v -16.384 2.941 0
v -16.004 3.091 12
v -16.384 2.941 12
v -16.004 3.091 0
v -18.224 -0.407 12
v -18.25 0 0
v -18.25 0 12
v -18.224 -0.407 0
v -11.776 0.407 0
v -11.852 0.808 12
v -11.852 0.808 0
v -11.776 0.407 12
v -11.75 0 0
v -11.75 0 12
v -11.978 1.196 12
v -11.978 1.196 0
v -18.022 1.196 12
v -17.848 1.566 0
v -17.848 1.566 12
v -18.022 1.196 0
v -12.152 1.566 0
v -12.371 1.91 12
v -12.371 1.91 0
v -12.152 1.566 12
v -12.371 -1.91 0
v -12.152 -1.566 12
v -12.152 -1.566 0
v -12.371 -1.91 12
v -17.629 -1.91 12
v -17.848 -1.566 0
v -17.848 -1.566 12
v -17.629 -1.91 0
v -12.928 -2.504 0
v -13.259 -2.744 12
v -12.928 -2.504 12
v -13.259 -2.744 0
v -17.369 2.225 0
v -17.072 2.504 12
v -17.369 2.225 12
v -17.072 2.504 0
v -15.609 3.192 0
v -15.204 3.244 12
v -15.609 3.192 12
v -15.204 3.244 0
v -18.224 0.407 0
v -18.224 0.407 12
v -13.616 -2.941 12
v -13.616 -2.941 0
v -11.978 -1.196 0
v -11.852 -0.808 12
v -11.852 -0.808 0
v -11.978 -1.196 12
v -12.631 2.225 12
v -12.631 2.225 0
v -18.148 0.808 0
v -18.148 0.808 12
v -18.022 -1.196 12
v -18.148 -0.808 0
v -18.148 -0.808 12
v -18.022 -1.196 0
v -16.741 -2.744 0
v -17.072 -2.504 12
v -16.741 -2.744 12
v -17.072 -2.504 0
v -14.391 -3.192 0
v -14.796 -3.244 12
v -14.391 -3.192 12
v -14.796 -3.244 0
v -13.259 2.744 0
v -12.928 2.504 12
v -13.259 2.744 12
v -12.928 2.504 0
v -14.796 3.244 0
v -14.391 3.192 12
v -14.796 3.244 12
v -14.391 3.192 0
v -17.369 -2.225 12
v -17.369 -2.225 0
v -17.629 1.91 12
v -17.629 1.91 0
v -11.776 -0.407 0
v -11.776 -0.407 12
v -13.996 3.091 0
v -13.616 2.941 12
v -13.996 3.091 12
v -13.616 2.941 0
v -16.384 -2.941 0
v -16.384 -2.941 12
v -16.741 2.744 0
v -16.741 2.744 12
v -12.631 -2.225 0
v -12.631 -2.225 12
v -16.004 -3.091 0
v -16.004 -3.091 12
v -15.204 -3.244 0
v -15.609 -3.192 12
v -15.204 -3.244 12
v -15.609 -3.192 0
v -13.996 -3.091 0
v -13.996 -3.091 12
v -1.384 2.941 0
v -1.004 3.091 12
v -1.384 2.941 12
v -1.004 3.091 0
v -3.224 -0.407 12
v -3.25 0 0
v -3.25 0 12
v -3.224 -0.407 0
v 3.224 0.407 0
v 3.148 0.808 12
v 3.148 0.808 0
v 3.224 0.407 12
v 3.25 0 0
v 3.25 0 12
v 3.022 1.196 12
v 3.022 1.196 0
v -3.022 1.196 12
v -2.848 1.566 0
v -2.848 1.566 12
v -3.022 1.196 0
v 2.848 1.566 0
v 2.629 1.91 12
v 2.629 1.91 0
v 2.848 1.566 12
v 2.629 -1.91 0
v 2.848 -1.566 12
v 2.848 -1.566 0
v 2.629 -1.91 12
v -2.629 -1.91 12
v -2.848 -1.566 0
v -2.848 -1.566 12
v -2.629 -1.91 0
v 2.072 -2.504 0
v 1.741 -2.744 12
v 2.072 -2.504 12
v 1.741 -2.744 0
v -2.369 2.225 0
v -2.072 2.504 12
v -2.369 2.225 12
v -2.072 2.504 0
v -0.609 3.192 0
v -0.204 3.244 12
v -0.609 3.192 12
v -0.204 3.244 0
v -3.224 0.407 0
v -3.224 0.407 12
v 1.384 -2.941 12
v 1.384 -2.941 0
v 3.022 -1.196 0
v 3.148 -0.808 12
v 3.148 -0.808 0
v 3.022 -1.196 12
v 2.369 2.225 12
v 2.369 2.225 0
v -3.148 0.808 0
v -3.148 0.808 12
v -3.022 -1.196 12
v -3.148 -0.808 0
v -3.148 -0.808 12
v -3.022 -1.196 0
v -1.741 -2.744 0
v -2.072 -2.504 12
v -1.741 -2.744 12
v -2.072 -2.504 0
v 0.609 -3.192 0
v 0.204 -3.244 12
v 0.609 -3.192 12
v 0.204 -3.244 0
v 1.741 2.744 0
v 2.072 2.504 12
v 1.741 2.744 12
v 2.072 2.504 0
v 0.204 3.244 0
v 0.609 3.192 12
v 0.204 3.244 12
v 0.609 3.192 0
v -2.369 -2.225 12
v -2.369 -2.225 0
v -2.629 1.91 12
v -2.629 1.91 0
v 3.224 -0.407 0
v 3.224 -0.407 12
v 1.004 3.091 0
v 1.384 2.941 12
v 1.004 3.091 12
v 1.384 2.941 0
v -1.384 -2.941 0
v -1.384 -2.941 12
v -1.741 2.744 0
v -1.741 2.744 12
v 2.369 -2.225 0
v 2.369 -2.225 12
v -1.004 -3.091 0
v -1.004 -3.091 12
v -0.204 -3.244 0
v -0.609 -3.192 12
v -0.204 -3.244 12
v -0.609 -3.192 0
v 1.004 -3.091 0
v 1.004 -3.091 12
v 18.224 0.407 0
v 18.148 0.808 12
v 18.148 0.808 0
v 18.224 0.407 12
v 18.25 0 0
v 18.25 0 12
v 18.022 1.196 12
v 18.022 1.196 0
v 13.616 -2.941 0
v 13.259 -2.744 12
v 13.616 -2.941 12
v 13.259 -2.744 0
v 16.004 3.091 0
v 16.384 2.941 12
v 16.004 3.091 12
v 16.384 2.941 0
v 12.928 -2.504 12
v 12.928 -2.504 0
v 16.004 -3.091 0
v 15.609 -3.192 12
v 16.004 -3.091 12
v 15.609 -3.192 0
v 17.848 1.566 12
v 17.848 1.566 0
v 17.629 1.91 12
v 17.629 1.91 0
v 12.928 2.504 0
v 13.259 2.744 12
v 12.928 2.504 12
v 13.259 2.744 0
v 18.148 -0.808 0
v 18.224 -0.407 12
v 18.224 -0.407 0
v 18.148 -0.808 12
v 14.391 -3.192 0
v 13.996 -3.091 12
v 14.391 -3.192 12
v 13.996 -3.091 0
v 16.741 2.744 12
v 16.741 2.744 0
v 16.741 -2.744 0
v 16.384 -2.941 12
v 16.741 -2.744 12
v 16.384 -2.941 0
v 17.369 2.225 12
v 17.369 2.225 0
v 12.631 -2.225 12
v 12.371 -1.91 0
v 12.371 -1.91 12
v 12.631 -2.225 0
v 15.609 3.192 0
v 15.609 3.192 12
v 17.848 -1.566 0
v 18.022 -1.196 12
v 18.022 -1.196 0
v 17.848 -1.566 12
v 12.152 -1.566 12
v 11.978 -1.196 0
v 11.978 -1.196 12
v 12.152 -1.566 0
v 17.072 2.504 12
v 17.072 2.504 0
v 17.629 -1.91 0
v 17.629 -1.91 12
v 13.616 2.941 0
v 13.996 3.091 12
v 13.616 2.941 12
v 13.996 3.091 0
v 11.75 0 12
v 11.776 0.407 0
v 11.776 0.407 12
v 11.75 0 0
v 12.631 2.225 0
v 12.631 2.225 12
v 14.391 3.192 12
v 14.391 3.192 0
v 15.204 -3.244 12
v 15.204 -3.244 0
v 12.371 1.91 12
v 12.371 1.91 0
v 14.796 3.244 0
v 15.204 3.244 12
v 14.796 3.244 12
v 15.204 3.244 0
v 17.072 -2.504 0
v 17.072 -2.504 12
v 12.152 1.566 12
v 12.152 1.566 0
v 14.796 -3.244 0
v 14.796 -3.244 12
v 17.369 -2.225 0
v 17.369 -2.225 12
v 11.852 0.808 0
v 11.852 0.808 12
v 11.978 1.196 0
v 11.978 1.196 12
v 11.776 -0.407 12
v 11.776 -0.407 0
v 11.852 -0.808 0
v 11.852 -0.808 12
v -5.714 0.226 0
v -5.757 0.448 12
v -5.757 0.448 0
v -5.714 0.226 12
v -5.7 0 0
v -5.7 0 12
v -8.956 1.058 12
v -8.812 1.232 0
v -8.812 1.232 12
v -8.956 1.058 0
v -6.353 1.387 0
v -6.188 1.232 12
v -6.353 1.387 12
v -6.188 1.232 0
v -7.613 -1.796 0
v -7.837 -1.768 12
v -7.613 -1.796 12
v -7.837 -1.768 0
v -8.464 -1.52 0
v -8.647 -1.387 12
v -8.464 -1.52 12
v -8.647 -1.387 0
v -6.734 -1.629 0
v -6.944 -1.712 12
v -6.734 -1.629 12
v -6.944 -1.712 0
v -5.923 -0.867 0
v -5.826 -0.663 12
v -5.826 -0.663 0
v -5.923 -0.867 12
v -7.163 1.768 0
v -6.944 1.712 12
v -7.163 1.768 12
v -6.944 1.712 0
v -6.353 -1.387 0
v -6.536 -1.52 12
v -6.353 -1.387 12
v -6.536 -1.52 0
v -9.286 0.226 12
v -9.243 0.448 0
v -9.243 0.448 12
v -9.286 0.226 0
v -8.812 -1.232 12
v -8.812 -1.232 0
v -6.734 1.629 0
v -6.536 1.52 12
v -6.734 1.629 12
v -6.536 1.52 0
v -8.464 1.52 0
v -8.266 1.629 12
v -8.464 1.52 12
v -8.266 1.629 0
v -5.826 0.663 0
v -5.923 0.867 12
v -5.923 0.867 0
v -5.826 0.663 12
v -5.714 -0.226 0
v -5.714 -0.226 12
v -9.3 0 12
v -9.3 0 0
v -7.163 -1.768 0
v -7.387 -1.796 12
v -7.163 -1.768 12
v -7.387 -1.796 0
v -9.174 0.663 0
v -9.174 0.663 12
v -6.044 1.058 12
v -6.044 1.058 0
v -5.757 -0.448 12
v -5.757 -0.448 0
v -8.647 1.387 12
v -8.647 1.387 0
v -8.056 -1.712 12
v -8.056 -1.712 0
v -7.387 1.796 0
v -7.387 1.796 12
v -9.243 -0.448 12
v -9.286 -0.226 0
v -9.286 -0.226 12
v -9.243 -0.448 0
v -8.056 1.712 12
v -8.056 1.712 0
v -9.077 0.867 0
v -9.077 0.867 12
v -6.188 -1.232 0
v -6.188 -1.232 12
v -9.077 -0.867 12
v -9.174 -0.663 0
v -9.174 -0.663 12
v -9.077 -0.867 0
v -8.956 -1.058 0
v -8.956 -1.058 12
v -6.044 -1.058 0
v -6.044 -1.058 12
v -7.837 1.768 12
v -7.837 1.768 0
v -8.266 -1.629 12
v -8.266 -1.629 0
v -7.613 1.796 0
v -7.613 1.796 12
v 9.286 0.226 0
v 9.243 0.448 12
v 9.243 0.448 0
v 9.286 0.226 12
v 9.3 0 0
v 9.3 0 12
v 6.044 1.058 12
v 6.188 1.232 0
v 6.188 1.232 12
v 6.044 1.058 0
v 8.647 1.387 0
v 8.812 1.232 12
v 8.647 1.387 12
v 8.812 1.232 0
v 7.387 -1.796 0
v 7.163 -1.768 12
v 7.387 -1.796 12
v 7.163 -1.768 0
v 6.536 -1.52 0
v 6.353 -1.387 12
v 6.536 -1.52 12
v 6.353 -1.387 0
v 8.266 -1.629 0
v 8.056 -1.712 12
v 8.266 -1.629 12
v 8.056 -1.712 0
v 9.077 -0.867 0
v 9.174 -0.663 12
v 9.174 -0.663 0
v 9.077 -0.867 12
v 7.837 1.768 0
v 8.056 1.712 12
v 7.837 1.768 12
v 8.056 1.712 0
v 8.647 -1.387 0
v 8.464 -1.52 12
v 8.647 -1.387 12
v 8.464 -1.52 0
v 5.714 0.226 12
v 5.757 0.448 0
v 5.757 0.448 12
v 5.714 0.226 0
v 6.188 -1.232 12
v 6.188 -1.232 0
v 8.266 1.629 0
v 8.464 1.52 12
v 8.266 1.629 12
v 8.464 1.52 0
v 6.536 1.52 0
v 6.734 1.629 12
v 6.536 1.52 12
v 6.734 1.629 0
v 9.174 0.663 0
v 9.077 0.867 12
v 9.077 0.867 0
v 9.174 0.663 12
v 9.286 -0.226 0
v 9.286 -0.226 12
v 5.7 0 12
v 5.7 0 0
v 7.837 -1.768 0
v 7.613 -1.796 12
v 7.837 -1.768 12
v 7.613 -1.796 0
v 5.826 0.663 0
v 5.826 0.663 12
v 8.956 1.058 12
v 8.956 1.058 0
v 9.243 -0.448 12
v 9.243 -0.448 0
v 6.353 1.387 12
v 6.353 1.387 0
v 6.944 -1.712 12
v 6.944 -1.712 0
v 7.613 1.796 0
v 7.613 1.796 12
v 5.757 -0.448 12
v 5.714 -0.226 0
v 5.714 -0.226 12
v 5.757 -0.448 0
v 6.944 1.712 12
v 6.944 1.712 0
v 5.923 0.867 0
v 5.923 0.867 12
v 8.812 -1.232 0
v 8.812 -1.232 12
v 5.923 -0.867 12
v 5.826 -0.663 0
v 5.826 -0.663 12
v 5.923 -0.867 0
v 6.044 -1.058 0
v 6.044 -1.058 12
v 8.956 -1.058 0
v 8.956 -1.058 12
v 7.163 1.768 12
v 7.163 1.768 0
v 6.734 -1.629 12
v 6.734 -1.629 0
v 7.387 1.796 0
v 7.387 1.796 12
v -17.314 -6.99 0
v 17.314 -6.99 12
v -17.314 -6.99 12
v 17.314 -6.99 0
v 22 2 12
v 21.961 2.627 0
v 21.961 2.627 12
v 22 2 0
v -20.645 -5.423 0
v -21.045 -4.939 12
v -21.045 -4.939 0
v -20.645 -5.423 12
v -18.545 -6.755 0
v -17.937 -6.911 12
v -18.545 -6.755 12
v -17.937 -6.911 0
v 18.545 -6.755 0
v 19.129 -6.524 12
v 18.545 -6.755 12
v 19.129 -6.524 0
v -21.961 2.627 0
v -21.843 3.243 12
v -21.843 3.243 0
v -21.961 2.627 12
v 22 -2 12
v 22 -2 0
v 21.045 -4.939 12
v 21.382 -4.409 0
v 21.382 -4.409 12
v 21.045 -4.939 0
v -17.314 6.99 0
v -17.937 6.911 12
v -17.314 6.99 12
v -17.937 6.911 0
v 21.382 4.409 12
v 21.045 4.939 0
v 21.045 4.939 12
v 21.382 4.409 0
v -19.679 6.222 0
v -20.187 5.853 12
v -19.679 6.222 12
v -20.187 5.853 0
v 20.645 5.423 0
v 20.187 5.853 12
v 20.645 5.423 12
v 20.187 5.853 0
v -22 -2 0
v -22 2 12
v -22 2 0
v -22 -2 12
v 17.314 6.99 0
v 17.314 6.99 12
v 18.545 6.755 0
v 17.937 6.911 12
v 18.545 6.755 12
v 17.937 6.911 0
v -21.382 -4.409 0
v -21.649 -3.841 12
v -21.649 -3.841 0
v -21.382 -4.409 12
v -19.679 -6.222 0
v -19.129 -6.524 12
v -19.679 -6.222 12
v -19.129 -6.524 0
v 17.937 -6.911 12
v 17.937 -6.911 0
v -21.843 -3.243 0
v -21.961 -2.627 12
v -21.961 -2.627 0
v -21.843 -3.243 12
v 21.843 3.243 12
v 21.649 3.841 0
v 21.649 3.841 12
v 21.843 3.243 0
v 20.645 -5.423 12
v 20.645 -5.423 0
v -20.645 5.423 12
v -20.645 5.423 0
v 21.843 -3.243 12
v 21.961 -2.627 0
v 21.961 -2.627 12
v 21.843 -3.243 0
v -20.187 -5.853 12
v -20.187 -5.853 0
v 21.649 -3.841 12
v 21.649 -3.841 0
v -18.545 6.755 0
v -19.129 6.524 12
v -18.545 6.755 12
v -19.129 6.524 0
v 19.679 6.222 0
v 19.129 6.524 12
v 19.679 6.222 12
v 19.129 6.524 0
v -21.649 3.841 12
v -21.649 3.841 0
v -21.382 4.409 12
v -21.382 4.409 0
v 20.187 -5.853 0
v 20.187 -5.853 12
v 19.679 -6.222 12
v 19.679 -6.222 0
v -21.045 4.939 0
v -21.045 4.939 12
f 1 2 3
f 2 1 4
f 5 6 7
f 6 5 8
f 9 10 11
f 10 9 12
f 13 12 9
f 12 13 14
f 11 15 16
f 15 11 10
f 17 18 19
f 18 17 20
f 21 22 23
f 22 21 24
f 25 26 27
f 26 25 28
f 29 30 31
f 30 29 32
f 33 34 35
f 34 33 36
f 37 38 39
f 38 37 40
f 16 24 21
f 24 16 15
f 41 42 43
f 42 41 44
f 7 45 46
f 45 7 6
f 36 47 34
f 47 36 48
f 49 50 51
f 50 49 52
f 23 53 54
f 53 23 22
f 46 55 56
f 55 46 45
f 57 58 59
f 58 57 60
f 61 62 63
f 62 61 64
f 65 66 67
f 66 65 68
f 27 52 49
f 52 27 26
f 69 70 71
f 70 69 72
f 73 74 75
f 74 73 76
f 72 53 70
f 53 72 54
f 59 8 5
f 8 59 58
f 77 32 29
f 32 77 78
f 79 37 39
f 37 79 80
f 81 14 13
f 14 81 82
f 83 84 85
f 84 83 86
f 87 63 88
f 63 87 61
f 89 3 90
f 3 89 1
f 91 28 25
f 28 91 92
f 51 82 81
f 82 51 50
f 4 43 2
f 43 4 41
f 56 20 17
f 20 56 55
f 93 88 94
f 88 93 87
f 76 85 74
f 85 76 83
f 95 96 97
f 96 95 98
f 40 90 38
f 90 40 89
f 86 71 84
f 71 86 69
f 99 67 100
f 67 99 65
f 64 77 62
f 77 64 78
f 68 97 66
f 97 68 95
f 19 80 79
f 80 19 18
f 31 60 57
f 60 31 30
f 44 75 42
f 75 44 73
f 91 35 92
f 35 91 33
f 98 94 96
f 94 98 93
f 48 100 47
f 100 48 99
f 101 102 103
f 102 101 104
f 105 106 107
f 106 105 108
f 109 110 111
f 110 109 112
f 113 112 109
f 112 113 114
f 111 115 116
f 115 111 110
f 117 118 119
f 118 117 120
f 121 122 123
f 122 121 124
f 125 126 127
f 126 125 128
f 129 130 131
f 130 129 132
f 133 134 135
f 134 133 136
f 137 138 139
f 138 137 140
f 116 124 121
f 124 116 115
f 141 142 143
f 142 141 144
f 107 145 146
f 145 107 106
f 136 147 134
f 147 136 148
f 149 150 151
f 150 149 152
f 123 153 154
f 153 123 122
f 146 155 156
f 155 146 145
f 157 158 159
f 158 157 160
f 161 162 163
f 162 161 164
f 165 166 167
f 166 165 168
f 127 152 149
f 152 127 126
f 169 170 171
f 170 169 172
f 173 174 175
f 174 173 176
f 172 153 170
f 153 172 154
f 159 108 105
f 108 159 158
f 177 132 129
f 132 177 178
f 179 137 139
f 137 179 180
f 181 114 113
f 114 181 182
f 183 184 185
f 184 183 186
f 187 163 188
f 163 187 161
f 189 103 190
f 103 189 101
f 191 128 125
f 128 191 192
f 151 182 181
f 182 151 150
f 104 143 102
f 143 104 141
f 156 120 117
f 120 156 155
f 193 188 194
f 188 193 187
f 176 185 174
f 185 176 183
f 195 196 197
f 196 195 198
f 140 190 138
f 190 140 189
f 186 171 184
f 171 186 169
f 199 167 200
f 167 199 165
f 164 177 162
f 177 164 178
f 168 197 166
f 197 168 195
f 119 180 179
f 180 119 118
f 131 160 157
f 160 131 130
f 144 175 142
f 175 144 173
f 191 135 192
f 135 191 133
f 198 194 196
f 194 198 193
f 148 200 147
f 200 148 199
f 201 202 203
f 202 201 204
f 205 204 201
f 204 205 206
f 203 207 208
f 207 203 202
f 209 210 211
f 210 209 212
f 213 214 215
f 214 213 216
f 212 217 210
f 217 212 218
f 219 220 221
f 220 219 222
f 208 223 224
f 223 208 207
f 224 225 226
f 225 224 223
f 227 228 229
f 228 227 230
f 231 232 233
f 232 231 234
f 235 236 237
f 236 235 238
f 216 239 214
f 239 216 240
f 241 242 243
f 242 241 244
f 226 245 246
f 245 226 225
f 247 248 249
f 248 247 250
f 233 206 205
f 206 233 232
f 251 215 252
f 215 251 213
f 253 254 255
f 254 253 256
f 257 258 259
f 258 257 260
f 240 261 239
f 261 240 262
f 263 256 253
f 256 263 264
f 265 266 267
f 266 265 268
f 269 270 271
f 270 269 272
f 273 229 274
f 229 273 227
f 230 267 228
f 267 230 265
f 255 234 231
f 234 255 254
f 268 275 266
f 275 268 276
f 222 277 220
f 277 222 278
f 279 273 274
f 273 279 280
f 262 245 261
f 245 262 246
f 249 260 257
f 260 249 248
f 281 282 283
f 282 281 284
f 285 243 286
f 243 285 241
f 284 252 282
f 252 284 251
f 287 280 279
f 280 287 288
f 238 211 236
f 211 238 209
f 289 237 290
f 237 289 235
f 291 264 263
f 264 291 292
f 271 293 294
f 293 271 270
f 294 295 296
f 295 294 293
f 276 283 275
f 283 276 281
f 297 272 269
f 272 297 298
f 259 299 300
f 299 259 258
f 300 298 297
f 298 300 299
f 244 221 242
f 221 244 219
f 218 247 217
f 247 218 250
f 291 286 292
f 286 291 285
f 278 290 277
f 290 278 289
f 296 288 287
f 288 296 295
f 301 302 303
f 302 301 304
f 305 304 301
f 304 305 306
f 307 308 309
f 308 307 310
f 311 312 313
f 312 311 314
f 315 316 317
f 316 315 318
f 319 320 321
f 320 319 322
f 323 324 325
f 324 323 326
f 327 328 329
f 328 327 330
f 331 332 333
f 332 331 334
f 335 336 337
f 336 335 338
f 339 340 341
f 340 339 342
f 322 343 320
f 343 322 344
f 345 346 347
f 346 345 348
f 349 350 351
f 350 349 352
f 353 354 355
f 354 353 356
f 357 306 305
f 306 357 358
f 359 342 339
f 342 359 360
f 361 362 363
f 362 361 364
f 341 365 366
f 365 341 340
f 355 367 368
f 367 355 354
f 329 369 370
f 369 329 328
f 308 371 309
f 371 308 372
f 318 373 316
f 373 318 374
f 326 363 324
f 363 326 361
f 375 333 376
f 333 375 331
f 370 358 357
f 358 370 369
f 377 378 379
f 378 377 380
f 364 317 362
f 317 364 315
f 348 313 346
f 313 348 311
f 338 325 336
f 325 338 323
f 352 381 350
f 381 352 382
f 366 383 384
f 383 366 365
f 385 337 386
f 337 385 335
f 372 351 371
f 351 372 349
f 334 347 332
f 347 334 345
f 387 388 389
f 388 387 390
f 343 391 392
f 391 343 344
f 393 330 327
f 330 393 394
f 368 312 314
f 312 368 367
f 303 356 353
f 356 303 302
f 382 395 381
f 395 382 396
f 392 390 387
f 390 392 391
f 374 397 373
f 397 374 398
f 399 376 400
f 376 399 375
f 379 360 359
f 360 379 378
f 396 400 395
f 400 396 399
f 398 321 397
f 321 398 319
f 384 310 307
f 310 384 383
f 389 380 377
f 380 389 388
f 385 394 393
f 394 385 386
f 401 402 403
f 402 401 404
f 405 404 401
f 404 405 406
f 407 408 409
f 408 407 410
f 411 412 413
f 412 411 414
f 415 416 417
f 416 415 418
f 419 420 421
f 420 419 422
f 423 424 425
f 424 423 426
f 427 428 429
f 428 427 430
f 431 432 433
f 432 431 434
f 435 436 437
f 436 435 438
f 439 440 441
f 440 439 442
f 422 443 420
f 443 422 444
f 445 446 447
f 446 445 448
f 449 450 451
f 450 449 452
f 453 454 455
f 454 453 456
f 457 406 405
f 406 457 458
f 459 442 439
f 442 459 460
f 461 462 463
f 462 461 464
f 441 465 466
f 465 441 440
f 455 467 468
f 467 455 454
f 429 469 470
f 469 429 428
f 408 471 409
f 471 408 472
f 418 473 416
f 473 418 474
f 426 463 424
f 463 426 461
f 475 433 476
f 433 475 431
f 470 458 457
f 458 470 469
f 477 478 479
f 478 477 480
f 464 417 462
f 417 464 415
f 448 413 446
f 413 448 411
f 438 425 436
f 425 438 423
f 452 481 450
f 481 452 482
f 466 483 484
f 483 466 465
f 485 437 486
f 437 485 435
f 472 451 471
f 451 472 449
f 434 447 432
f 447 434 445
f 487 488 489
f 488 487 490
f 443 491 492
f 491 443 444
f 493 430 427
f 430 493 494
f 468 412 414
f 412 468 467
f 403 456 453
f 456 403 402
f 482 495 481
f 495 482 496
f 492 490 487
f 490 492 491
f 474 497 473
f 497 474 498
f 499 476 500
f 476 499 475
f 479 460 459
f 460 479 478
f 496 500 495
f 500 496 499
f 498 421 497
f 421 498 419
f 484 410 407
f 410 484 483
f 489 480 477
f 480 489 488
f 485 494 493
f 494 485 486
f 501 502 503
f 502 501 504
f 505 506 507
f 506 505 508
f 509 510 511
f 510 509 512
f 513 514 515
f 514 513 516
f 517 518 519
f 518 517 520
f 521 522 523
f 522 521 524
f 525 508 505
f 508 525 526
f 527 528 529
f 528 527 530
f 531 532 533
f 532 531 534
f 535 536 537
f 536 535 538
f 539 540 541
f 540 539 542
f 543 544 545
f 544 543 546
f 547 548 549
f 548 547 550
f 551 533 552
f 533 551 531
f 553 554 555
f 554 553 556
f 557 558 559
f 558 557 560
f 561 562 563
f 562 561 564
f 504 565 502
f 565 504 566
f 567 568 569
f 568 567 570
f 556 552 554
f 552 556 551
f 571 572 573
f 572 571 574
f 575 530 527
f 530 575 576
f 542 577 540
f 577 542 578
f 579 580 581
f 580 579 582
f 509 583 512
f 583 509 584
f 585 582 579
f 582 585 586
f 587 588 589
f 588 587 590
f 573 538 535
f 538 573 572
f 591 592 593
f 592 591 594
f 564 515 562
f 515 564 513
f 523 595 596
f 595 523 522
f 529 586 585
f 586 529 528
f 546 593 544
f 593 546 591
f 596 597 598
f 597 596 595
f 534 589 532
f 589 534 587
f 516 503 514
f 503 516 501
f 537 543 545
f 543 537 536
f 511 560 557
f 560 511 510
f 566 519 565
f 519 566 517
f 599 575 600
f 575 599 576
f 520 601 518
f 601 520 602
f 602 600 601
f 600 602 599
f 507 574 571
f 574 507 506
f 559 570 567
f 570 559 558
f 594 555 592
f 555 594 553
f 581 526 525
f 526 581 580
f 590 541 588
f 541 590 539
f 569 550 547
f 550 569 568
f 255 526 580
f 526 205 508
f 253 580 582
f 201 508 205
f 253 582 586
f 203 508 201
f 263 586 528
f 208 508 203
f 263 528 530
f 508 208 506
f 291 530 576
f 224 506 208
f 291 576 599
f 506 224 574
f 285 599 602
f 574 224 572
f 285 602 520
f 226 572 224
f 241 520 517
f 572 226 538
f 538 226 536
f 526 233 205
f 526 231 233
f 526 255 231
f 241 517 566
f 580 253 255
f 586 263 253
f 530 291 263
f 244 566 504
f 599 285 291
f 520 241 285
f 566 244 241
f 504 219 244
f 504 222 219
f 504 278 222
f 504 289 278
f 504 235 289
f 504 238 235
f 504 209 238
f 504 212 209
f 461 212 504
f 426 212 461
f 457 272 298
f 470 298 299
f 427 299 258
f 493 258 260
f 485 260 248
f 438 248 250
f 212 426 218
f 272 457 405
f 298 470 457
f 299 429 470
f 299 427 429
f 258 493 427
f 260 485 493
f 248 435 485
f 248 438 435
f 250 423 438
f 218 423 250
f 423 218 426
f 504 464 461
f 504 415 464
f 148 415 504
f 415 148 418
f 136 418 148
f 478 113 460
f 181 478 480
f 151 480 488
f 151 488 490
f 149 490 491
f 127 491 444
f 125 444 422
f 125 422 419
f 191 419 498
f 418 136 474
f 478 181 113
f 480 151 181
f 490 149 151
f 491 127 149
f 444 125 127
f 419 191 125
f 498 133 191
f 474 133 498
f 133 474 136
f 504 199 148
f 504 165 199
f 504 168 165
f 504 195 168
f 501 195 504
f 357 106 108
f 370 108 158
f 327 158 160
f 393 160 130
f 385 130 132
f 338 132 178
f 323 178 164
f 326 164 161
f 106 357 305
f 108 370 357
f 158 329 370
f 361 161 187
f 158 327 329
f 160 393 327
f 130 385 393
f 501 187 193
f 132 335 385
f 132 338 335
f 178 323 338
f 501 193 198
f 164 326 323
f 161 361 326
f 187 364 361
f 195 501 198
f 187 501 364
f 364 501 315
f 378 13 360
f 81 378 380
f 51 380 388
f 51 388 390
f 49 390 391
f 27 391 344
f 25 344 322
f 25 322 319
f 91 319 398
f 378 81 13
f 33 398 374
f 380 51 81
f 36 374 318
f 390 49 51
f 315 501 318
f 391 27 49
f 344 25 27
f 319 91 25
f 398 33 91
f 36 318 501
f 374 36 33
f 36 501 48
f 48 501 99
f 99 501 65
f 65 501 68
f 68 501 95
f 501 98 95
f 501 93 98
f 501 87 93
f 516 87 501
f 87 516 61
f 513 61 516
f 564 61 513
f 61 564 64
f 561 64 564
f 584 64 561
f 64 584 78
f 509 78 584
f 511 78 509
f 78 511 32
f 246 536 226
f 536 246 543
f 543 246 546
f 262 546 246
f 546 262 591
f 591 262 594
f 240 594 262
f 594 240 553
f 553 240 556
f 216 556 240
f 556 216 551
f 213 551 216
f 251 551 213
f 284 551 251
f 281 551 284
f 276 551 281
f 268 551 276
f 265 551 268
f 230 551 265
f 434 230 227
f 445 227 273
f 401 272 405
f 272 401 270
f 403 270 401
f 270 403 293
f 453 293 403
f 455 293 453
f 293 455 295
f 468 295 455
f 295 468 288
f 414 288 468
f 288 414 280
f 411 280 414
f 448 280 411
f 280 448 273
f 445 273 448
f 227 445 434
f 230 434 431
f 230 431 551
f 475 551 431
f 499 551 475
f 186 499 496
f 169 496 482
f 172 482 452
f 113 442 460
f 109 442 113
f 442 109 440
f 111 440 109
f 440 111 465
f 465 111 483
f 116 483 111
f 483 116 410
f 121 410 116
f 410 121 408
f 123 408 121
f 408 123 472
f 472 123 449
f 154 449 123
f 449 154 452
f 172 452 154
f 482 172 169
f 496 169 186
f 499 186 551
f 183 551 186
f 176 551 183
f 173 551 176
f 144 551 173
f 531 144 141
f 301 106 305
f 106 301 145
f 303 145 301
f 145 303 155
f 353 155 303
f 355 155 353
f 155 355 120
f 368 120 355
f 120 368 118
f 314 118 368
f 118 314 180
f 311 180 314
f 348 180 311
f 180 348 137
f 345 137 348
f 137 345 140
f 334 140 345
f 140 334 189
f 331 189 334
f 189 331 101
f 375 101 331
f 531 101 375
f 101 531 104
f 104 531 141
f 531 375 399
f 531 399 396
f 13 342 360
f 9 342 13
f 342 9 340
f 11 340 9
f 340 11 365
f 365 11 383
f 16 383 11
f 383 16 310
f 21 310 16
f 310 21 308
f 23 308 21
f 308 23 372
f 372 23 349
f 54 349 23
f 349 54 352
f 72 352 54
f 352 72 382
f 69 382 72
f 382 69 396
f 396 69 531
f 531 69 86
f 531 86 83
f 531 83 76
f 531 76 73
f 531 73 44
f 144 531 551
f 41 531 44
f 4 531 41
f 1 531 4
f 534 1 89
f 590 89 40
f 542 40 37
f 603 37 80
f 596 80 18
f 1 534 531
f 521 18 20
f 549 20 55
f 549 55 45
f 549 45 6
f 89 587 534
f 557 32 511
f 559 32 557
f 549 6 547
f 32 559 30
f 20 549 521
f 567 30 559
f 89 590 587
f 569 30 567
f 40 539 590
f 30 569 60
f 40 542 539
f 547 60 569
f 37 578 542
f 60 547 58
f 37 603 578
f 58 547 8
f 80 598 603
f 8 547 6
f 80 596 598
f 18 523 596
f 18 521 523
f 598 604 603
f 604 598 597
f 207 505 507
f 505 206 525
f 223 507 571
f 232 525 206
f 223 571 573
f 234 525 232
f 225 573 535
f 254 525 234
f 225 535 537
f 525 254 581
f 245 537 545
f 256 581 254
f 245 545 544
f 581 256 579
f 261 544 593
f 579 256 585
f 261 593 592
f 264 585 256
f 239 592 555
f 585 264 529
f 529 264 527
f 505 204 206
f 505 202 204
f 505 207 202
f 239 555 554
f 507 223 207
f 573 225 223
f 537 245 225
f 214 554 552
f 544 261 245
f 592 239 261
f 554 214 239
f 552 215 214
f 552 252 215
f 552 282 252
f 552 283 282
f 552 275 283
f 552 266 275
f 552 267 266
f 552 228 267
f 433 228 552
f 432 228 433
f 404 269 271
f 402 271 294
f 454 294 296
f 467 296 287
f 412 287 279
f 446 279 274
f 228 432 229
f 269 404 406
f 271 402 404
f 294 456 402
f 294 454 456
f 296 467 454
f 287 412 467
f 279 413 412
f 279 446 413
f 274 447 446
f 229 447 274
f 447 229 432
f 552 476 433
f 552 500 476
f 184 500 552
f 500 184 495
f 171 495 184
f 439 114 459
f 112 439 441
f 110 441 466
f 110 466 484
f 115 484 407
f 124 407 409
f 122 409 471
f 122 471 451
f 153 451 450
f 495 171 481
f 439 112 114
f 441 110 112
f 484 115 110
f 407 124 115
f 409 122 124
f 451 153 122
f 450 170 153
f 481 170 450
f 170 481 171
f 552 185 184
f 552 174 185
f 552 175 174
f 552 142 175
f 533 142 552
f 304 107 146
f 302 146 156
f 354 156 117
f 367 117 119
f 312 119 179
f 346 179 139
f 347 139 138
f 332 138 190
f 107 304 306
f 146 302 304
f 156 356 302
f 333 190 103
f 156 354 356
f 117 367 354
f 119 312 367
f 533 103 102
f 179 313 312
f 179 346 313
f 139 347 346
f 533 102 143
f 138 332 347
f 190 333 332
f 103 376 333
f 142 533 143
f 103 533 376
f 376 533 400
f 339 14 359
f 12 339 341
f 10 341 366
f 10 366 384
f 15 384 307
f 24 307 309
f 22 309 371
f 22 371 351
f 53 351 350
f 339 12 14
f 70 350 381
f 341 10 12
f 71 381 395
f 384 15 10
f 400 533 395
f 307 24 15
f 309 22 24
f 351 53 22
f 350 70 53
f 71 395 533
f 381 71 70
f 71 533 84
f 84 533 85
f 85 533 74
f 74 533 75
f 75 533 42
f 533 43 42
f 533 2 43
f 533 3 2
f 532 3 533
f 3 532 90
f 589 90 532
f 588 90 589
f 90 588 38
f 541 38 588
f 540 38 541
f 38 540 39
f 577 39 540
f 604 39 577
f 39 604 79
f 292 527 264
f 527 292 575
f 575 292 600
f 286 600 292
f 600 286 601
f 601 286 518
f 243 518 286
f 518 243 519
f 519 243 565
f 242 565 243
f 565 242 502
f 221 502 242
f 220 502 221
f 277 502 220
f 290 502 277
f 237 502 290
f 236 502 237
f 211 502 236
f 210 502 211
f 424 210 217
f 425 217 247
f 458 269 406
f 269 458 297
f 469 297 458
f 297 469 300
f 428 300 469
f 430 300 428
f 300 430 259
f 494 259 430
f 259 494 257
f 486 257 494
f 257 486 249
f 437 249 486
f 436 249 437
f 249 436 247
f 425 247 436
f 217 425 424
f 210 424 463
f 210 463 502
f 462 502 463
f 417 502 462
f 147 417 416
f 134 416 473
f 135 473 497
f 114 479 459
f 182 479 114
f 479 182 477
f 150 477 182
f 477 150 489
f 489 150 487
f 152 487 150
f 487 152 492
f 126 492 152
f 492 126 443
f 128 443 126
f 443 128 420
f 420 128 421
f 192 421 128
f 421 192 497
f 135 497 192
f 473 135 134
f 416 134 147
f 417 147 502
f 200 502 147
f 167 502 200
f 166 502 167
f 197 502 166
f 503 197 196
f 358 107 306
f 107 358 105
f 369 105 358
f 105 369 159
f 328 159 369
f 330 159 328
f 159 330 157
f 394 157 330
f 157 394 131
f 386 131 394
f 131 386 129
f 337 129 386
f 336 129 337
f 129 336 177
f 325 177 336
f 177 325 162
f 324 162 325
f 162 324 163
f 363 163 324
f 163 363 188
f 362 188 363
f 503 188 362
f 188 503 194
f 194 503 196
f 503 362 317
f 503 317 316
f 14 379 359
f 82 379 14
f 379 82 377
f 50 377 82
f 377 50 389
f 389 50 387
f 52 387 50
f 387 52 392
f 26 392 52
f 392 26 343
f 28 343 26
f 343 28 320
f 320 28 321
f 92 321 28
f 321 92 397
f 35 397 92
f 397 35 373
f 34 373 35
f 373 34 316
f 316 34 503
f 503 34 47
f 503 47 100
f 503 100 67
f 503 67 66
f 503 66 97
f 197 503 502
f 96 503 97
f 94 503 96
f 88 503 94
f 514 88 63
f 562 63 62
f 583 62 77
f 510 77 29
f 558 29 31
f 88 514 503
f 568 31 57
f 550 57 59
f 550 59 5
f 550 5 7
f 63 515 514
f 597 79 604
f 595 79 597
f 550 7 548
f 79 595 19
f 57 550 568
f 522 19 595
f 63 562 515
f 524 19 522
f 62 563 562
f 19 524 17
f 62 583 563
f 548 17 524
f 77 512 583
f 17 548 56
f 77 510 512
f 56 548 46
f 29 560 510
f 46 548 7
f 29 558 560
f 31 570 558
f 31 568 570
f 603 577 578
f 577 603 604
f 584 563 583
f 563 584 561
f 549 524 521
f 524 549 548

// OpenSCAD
$fn = 50;


difference() {
	union() {
		hull() {
			translate(v = [-17.0000000000, 2.0000000000, 0]) {
				cylinder(h = 12, r = 5);
			}
			translate(v = [17.0000000000, 2.0000000000, 0]) {
				cylinder(h = 12, r = 5);
			}
			translate(v = [-17.0000000000, -2.0000000000, 0]) {
				cylinder(h = 12, r = 5);
			}
			translate(v = [17.0000000000, -2.0000000000, 0]) {
				cylinder(h = 12, r = 5);
			}
		}
	}
	union() {
		translate(v = [-15.0000000000, 0.0000000000, 0]) {
			translate(v = [0, 0, -100]) {
				cylinder(h = 200, r = 3.2500000000);
			}
		}
		translate(v = [0, 0, -100]) {
			cylinder(h = 200, r = 3.2500000000);
		}
		translate(v = [15.0000000000, 0.0000000000, 0]) {
			translate(v = [0, 0, -100]) {
				cylinder(h = 200, r = 3.2500000000);
			}
		}
		translate(v = [-15.0000000000, 0.0000000000, 0]) {
			translate(v = [0, 0, -100]) {
				cylinder(h = 200, r = 1.8000000000);
			}
		}
		translate(v = [-7.5000000000, 0.0000000000, 0]) {
			translate(v = [0, 0, -100]) {
				cylinder(h = 200, r = 1.8000000000);
			}
		}
		translate(v = [0, 0, -100]) {
			cylinder(h = 200, r = 1.8000000000);
		}
		translate(v = [7.5000000000, 0.0000000000, 0]) {
			translate(v = [0, 0, -100]) {
				cylinder(h = 200, r = 1.8000000000);
			}
		}
		translate(v = [15.0000000000, 0.0000000000, 0]) {
			translate(v = [0, 0, -100]) {
				cylinder(h = 200, r = 1.8000000000);
			}
		}
	}
}
